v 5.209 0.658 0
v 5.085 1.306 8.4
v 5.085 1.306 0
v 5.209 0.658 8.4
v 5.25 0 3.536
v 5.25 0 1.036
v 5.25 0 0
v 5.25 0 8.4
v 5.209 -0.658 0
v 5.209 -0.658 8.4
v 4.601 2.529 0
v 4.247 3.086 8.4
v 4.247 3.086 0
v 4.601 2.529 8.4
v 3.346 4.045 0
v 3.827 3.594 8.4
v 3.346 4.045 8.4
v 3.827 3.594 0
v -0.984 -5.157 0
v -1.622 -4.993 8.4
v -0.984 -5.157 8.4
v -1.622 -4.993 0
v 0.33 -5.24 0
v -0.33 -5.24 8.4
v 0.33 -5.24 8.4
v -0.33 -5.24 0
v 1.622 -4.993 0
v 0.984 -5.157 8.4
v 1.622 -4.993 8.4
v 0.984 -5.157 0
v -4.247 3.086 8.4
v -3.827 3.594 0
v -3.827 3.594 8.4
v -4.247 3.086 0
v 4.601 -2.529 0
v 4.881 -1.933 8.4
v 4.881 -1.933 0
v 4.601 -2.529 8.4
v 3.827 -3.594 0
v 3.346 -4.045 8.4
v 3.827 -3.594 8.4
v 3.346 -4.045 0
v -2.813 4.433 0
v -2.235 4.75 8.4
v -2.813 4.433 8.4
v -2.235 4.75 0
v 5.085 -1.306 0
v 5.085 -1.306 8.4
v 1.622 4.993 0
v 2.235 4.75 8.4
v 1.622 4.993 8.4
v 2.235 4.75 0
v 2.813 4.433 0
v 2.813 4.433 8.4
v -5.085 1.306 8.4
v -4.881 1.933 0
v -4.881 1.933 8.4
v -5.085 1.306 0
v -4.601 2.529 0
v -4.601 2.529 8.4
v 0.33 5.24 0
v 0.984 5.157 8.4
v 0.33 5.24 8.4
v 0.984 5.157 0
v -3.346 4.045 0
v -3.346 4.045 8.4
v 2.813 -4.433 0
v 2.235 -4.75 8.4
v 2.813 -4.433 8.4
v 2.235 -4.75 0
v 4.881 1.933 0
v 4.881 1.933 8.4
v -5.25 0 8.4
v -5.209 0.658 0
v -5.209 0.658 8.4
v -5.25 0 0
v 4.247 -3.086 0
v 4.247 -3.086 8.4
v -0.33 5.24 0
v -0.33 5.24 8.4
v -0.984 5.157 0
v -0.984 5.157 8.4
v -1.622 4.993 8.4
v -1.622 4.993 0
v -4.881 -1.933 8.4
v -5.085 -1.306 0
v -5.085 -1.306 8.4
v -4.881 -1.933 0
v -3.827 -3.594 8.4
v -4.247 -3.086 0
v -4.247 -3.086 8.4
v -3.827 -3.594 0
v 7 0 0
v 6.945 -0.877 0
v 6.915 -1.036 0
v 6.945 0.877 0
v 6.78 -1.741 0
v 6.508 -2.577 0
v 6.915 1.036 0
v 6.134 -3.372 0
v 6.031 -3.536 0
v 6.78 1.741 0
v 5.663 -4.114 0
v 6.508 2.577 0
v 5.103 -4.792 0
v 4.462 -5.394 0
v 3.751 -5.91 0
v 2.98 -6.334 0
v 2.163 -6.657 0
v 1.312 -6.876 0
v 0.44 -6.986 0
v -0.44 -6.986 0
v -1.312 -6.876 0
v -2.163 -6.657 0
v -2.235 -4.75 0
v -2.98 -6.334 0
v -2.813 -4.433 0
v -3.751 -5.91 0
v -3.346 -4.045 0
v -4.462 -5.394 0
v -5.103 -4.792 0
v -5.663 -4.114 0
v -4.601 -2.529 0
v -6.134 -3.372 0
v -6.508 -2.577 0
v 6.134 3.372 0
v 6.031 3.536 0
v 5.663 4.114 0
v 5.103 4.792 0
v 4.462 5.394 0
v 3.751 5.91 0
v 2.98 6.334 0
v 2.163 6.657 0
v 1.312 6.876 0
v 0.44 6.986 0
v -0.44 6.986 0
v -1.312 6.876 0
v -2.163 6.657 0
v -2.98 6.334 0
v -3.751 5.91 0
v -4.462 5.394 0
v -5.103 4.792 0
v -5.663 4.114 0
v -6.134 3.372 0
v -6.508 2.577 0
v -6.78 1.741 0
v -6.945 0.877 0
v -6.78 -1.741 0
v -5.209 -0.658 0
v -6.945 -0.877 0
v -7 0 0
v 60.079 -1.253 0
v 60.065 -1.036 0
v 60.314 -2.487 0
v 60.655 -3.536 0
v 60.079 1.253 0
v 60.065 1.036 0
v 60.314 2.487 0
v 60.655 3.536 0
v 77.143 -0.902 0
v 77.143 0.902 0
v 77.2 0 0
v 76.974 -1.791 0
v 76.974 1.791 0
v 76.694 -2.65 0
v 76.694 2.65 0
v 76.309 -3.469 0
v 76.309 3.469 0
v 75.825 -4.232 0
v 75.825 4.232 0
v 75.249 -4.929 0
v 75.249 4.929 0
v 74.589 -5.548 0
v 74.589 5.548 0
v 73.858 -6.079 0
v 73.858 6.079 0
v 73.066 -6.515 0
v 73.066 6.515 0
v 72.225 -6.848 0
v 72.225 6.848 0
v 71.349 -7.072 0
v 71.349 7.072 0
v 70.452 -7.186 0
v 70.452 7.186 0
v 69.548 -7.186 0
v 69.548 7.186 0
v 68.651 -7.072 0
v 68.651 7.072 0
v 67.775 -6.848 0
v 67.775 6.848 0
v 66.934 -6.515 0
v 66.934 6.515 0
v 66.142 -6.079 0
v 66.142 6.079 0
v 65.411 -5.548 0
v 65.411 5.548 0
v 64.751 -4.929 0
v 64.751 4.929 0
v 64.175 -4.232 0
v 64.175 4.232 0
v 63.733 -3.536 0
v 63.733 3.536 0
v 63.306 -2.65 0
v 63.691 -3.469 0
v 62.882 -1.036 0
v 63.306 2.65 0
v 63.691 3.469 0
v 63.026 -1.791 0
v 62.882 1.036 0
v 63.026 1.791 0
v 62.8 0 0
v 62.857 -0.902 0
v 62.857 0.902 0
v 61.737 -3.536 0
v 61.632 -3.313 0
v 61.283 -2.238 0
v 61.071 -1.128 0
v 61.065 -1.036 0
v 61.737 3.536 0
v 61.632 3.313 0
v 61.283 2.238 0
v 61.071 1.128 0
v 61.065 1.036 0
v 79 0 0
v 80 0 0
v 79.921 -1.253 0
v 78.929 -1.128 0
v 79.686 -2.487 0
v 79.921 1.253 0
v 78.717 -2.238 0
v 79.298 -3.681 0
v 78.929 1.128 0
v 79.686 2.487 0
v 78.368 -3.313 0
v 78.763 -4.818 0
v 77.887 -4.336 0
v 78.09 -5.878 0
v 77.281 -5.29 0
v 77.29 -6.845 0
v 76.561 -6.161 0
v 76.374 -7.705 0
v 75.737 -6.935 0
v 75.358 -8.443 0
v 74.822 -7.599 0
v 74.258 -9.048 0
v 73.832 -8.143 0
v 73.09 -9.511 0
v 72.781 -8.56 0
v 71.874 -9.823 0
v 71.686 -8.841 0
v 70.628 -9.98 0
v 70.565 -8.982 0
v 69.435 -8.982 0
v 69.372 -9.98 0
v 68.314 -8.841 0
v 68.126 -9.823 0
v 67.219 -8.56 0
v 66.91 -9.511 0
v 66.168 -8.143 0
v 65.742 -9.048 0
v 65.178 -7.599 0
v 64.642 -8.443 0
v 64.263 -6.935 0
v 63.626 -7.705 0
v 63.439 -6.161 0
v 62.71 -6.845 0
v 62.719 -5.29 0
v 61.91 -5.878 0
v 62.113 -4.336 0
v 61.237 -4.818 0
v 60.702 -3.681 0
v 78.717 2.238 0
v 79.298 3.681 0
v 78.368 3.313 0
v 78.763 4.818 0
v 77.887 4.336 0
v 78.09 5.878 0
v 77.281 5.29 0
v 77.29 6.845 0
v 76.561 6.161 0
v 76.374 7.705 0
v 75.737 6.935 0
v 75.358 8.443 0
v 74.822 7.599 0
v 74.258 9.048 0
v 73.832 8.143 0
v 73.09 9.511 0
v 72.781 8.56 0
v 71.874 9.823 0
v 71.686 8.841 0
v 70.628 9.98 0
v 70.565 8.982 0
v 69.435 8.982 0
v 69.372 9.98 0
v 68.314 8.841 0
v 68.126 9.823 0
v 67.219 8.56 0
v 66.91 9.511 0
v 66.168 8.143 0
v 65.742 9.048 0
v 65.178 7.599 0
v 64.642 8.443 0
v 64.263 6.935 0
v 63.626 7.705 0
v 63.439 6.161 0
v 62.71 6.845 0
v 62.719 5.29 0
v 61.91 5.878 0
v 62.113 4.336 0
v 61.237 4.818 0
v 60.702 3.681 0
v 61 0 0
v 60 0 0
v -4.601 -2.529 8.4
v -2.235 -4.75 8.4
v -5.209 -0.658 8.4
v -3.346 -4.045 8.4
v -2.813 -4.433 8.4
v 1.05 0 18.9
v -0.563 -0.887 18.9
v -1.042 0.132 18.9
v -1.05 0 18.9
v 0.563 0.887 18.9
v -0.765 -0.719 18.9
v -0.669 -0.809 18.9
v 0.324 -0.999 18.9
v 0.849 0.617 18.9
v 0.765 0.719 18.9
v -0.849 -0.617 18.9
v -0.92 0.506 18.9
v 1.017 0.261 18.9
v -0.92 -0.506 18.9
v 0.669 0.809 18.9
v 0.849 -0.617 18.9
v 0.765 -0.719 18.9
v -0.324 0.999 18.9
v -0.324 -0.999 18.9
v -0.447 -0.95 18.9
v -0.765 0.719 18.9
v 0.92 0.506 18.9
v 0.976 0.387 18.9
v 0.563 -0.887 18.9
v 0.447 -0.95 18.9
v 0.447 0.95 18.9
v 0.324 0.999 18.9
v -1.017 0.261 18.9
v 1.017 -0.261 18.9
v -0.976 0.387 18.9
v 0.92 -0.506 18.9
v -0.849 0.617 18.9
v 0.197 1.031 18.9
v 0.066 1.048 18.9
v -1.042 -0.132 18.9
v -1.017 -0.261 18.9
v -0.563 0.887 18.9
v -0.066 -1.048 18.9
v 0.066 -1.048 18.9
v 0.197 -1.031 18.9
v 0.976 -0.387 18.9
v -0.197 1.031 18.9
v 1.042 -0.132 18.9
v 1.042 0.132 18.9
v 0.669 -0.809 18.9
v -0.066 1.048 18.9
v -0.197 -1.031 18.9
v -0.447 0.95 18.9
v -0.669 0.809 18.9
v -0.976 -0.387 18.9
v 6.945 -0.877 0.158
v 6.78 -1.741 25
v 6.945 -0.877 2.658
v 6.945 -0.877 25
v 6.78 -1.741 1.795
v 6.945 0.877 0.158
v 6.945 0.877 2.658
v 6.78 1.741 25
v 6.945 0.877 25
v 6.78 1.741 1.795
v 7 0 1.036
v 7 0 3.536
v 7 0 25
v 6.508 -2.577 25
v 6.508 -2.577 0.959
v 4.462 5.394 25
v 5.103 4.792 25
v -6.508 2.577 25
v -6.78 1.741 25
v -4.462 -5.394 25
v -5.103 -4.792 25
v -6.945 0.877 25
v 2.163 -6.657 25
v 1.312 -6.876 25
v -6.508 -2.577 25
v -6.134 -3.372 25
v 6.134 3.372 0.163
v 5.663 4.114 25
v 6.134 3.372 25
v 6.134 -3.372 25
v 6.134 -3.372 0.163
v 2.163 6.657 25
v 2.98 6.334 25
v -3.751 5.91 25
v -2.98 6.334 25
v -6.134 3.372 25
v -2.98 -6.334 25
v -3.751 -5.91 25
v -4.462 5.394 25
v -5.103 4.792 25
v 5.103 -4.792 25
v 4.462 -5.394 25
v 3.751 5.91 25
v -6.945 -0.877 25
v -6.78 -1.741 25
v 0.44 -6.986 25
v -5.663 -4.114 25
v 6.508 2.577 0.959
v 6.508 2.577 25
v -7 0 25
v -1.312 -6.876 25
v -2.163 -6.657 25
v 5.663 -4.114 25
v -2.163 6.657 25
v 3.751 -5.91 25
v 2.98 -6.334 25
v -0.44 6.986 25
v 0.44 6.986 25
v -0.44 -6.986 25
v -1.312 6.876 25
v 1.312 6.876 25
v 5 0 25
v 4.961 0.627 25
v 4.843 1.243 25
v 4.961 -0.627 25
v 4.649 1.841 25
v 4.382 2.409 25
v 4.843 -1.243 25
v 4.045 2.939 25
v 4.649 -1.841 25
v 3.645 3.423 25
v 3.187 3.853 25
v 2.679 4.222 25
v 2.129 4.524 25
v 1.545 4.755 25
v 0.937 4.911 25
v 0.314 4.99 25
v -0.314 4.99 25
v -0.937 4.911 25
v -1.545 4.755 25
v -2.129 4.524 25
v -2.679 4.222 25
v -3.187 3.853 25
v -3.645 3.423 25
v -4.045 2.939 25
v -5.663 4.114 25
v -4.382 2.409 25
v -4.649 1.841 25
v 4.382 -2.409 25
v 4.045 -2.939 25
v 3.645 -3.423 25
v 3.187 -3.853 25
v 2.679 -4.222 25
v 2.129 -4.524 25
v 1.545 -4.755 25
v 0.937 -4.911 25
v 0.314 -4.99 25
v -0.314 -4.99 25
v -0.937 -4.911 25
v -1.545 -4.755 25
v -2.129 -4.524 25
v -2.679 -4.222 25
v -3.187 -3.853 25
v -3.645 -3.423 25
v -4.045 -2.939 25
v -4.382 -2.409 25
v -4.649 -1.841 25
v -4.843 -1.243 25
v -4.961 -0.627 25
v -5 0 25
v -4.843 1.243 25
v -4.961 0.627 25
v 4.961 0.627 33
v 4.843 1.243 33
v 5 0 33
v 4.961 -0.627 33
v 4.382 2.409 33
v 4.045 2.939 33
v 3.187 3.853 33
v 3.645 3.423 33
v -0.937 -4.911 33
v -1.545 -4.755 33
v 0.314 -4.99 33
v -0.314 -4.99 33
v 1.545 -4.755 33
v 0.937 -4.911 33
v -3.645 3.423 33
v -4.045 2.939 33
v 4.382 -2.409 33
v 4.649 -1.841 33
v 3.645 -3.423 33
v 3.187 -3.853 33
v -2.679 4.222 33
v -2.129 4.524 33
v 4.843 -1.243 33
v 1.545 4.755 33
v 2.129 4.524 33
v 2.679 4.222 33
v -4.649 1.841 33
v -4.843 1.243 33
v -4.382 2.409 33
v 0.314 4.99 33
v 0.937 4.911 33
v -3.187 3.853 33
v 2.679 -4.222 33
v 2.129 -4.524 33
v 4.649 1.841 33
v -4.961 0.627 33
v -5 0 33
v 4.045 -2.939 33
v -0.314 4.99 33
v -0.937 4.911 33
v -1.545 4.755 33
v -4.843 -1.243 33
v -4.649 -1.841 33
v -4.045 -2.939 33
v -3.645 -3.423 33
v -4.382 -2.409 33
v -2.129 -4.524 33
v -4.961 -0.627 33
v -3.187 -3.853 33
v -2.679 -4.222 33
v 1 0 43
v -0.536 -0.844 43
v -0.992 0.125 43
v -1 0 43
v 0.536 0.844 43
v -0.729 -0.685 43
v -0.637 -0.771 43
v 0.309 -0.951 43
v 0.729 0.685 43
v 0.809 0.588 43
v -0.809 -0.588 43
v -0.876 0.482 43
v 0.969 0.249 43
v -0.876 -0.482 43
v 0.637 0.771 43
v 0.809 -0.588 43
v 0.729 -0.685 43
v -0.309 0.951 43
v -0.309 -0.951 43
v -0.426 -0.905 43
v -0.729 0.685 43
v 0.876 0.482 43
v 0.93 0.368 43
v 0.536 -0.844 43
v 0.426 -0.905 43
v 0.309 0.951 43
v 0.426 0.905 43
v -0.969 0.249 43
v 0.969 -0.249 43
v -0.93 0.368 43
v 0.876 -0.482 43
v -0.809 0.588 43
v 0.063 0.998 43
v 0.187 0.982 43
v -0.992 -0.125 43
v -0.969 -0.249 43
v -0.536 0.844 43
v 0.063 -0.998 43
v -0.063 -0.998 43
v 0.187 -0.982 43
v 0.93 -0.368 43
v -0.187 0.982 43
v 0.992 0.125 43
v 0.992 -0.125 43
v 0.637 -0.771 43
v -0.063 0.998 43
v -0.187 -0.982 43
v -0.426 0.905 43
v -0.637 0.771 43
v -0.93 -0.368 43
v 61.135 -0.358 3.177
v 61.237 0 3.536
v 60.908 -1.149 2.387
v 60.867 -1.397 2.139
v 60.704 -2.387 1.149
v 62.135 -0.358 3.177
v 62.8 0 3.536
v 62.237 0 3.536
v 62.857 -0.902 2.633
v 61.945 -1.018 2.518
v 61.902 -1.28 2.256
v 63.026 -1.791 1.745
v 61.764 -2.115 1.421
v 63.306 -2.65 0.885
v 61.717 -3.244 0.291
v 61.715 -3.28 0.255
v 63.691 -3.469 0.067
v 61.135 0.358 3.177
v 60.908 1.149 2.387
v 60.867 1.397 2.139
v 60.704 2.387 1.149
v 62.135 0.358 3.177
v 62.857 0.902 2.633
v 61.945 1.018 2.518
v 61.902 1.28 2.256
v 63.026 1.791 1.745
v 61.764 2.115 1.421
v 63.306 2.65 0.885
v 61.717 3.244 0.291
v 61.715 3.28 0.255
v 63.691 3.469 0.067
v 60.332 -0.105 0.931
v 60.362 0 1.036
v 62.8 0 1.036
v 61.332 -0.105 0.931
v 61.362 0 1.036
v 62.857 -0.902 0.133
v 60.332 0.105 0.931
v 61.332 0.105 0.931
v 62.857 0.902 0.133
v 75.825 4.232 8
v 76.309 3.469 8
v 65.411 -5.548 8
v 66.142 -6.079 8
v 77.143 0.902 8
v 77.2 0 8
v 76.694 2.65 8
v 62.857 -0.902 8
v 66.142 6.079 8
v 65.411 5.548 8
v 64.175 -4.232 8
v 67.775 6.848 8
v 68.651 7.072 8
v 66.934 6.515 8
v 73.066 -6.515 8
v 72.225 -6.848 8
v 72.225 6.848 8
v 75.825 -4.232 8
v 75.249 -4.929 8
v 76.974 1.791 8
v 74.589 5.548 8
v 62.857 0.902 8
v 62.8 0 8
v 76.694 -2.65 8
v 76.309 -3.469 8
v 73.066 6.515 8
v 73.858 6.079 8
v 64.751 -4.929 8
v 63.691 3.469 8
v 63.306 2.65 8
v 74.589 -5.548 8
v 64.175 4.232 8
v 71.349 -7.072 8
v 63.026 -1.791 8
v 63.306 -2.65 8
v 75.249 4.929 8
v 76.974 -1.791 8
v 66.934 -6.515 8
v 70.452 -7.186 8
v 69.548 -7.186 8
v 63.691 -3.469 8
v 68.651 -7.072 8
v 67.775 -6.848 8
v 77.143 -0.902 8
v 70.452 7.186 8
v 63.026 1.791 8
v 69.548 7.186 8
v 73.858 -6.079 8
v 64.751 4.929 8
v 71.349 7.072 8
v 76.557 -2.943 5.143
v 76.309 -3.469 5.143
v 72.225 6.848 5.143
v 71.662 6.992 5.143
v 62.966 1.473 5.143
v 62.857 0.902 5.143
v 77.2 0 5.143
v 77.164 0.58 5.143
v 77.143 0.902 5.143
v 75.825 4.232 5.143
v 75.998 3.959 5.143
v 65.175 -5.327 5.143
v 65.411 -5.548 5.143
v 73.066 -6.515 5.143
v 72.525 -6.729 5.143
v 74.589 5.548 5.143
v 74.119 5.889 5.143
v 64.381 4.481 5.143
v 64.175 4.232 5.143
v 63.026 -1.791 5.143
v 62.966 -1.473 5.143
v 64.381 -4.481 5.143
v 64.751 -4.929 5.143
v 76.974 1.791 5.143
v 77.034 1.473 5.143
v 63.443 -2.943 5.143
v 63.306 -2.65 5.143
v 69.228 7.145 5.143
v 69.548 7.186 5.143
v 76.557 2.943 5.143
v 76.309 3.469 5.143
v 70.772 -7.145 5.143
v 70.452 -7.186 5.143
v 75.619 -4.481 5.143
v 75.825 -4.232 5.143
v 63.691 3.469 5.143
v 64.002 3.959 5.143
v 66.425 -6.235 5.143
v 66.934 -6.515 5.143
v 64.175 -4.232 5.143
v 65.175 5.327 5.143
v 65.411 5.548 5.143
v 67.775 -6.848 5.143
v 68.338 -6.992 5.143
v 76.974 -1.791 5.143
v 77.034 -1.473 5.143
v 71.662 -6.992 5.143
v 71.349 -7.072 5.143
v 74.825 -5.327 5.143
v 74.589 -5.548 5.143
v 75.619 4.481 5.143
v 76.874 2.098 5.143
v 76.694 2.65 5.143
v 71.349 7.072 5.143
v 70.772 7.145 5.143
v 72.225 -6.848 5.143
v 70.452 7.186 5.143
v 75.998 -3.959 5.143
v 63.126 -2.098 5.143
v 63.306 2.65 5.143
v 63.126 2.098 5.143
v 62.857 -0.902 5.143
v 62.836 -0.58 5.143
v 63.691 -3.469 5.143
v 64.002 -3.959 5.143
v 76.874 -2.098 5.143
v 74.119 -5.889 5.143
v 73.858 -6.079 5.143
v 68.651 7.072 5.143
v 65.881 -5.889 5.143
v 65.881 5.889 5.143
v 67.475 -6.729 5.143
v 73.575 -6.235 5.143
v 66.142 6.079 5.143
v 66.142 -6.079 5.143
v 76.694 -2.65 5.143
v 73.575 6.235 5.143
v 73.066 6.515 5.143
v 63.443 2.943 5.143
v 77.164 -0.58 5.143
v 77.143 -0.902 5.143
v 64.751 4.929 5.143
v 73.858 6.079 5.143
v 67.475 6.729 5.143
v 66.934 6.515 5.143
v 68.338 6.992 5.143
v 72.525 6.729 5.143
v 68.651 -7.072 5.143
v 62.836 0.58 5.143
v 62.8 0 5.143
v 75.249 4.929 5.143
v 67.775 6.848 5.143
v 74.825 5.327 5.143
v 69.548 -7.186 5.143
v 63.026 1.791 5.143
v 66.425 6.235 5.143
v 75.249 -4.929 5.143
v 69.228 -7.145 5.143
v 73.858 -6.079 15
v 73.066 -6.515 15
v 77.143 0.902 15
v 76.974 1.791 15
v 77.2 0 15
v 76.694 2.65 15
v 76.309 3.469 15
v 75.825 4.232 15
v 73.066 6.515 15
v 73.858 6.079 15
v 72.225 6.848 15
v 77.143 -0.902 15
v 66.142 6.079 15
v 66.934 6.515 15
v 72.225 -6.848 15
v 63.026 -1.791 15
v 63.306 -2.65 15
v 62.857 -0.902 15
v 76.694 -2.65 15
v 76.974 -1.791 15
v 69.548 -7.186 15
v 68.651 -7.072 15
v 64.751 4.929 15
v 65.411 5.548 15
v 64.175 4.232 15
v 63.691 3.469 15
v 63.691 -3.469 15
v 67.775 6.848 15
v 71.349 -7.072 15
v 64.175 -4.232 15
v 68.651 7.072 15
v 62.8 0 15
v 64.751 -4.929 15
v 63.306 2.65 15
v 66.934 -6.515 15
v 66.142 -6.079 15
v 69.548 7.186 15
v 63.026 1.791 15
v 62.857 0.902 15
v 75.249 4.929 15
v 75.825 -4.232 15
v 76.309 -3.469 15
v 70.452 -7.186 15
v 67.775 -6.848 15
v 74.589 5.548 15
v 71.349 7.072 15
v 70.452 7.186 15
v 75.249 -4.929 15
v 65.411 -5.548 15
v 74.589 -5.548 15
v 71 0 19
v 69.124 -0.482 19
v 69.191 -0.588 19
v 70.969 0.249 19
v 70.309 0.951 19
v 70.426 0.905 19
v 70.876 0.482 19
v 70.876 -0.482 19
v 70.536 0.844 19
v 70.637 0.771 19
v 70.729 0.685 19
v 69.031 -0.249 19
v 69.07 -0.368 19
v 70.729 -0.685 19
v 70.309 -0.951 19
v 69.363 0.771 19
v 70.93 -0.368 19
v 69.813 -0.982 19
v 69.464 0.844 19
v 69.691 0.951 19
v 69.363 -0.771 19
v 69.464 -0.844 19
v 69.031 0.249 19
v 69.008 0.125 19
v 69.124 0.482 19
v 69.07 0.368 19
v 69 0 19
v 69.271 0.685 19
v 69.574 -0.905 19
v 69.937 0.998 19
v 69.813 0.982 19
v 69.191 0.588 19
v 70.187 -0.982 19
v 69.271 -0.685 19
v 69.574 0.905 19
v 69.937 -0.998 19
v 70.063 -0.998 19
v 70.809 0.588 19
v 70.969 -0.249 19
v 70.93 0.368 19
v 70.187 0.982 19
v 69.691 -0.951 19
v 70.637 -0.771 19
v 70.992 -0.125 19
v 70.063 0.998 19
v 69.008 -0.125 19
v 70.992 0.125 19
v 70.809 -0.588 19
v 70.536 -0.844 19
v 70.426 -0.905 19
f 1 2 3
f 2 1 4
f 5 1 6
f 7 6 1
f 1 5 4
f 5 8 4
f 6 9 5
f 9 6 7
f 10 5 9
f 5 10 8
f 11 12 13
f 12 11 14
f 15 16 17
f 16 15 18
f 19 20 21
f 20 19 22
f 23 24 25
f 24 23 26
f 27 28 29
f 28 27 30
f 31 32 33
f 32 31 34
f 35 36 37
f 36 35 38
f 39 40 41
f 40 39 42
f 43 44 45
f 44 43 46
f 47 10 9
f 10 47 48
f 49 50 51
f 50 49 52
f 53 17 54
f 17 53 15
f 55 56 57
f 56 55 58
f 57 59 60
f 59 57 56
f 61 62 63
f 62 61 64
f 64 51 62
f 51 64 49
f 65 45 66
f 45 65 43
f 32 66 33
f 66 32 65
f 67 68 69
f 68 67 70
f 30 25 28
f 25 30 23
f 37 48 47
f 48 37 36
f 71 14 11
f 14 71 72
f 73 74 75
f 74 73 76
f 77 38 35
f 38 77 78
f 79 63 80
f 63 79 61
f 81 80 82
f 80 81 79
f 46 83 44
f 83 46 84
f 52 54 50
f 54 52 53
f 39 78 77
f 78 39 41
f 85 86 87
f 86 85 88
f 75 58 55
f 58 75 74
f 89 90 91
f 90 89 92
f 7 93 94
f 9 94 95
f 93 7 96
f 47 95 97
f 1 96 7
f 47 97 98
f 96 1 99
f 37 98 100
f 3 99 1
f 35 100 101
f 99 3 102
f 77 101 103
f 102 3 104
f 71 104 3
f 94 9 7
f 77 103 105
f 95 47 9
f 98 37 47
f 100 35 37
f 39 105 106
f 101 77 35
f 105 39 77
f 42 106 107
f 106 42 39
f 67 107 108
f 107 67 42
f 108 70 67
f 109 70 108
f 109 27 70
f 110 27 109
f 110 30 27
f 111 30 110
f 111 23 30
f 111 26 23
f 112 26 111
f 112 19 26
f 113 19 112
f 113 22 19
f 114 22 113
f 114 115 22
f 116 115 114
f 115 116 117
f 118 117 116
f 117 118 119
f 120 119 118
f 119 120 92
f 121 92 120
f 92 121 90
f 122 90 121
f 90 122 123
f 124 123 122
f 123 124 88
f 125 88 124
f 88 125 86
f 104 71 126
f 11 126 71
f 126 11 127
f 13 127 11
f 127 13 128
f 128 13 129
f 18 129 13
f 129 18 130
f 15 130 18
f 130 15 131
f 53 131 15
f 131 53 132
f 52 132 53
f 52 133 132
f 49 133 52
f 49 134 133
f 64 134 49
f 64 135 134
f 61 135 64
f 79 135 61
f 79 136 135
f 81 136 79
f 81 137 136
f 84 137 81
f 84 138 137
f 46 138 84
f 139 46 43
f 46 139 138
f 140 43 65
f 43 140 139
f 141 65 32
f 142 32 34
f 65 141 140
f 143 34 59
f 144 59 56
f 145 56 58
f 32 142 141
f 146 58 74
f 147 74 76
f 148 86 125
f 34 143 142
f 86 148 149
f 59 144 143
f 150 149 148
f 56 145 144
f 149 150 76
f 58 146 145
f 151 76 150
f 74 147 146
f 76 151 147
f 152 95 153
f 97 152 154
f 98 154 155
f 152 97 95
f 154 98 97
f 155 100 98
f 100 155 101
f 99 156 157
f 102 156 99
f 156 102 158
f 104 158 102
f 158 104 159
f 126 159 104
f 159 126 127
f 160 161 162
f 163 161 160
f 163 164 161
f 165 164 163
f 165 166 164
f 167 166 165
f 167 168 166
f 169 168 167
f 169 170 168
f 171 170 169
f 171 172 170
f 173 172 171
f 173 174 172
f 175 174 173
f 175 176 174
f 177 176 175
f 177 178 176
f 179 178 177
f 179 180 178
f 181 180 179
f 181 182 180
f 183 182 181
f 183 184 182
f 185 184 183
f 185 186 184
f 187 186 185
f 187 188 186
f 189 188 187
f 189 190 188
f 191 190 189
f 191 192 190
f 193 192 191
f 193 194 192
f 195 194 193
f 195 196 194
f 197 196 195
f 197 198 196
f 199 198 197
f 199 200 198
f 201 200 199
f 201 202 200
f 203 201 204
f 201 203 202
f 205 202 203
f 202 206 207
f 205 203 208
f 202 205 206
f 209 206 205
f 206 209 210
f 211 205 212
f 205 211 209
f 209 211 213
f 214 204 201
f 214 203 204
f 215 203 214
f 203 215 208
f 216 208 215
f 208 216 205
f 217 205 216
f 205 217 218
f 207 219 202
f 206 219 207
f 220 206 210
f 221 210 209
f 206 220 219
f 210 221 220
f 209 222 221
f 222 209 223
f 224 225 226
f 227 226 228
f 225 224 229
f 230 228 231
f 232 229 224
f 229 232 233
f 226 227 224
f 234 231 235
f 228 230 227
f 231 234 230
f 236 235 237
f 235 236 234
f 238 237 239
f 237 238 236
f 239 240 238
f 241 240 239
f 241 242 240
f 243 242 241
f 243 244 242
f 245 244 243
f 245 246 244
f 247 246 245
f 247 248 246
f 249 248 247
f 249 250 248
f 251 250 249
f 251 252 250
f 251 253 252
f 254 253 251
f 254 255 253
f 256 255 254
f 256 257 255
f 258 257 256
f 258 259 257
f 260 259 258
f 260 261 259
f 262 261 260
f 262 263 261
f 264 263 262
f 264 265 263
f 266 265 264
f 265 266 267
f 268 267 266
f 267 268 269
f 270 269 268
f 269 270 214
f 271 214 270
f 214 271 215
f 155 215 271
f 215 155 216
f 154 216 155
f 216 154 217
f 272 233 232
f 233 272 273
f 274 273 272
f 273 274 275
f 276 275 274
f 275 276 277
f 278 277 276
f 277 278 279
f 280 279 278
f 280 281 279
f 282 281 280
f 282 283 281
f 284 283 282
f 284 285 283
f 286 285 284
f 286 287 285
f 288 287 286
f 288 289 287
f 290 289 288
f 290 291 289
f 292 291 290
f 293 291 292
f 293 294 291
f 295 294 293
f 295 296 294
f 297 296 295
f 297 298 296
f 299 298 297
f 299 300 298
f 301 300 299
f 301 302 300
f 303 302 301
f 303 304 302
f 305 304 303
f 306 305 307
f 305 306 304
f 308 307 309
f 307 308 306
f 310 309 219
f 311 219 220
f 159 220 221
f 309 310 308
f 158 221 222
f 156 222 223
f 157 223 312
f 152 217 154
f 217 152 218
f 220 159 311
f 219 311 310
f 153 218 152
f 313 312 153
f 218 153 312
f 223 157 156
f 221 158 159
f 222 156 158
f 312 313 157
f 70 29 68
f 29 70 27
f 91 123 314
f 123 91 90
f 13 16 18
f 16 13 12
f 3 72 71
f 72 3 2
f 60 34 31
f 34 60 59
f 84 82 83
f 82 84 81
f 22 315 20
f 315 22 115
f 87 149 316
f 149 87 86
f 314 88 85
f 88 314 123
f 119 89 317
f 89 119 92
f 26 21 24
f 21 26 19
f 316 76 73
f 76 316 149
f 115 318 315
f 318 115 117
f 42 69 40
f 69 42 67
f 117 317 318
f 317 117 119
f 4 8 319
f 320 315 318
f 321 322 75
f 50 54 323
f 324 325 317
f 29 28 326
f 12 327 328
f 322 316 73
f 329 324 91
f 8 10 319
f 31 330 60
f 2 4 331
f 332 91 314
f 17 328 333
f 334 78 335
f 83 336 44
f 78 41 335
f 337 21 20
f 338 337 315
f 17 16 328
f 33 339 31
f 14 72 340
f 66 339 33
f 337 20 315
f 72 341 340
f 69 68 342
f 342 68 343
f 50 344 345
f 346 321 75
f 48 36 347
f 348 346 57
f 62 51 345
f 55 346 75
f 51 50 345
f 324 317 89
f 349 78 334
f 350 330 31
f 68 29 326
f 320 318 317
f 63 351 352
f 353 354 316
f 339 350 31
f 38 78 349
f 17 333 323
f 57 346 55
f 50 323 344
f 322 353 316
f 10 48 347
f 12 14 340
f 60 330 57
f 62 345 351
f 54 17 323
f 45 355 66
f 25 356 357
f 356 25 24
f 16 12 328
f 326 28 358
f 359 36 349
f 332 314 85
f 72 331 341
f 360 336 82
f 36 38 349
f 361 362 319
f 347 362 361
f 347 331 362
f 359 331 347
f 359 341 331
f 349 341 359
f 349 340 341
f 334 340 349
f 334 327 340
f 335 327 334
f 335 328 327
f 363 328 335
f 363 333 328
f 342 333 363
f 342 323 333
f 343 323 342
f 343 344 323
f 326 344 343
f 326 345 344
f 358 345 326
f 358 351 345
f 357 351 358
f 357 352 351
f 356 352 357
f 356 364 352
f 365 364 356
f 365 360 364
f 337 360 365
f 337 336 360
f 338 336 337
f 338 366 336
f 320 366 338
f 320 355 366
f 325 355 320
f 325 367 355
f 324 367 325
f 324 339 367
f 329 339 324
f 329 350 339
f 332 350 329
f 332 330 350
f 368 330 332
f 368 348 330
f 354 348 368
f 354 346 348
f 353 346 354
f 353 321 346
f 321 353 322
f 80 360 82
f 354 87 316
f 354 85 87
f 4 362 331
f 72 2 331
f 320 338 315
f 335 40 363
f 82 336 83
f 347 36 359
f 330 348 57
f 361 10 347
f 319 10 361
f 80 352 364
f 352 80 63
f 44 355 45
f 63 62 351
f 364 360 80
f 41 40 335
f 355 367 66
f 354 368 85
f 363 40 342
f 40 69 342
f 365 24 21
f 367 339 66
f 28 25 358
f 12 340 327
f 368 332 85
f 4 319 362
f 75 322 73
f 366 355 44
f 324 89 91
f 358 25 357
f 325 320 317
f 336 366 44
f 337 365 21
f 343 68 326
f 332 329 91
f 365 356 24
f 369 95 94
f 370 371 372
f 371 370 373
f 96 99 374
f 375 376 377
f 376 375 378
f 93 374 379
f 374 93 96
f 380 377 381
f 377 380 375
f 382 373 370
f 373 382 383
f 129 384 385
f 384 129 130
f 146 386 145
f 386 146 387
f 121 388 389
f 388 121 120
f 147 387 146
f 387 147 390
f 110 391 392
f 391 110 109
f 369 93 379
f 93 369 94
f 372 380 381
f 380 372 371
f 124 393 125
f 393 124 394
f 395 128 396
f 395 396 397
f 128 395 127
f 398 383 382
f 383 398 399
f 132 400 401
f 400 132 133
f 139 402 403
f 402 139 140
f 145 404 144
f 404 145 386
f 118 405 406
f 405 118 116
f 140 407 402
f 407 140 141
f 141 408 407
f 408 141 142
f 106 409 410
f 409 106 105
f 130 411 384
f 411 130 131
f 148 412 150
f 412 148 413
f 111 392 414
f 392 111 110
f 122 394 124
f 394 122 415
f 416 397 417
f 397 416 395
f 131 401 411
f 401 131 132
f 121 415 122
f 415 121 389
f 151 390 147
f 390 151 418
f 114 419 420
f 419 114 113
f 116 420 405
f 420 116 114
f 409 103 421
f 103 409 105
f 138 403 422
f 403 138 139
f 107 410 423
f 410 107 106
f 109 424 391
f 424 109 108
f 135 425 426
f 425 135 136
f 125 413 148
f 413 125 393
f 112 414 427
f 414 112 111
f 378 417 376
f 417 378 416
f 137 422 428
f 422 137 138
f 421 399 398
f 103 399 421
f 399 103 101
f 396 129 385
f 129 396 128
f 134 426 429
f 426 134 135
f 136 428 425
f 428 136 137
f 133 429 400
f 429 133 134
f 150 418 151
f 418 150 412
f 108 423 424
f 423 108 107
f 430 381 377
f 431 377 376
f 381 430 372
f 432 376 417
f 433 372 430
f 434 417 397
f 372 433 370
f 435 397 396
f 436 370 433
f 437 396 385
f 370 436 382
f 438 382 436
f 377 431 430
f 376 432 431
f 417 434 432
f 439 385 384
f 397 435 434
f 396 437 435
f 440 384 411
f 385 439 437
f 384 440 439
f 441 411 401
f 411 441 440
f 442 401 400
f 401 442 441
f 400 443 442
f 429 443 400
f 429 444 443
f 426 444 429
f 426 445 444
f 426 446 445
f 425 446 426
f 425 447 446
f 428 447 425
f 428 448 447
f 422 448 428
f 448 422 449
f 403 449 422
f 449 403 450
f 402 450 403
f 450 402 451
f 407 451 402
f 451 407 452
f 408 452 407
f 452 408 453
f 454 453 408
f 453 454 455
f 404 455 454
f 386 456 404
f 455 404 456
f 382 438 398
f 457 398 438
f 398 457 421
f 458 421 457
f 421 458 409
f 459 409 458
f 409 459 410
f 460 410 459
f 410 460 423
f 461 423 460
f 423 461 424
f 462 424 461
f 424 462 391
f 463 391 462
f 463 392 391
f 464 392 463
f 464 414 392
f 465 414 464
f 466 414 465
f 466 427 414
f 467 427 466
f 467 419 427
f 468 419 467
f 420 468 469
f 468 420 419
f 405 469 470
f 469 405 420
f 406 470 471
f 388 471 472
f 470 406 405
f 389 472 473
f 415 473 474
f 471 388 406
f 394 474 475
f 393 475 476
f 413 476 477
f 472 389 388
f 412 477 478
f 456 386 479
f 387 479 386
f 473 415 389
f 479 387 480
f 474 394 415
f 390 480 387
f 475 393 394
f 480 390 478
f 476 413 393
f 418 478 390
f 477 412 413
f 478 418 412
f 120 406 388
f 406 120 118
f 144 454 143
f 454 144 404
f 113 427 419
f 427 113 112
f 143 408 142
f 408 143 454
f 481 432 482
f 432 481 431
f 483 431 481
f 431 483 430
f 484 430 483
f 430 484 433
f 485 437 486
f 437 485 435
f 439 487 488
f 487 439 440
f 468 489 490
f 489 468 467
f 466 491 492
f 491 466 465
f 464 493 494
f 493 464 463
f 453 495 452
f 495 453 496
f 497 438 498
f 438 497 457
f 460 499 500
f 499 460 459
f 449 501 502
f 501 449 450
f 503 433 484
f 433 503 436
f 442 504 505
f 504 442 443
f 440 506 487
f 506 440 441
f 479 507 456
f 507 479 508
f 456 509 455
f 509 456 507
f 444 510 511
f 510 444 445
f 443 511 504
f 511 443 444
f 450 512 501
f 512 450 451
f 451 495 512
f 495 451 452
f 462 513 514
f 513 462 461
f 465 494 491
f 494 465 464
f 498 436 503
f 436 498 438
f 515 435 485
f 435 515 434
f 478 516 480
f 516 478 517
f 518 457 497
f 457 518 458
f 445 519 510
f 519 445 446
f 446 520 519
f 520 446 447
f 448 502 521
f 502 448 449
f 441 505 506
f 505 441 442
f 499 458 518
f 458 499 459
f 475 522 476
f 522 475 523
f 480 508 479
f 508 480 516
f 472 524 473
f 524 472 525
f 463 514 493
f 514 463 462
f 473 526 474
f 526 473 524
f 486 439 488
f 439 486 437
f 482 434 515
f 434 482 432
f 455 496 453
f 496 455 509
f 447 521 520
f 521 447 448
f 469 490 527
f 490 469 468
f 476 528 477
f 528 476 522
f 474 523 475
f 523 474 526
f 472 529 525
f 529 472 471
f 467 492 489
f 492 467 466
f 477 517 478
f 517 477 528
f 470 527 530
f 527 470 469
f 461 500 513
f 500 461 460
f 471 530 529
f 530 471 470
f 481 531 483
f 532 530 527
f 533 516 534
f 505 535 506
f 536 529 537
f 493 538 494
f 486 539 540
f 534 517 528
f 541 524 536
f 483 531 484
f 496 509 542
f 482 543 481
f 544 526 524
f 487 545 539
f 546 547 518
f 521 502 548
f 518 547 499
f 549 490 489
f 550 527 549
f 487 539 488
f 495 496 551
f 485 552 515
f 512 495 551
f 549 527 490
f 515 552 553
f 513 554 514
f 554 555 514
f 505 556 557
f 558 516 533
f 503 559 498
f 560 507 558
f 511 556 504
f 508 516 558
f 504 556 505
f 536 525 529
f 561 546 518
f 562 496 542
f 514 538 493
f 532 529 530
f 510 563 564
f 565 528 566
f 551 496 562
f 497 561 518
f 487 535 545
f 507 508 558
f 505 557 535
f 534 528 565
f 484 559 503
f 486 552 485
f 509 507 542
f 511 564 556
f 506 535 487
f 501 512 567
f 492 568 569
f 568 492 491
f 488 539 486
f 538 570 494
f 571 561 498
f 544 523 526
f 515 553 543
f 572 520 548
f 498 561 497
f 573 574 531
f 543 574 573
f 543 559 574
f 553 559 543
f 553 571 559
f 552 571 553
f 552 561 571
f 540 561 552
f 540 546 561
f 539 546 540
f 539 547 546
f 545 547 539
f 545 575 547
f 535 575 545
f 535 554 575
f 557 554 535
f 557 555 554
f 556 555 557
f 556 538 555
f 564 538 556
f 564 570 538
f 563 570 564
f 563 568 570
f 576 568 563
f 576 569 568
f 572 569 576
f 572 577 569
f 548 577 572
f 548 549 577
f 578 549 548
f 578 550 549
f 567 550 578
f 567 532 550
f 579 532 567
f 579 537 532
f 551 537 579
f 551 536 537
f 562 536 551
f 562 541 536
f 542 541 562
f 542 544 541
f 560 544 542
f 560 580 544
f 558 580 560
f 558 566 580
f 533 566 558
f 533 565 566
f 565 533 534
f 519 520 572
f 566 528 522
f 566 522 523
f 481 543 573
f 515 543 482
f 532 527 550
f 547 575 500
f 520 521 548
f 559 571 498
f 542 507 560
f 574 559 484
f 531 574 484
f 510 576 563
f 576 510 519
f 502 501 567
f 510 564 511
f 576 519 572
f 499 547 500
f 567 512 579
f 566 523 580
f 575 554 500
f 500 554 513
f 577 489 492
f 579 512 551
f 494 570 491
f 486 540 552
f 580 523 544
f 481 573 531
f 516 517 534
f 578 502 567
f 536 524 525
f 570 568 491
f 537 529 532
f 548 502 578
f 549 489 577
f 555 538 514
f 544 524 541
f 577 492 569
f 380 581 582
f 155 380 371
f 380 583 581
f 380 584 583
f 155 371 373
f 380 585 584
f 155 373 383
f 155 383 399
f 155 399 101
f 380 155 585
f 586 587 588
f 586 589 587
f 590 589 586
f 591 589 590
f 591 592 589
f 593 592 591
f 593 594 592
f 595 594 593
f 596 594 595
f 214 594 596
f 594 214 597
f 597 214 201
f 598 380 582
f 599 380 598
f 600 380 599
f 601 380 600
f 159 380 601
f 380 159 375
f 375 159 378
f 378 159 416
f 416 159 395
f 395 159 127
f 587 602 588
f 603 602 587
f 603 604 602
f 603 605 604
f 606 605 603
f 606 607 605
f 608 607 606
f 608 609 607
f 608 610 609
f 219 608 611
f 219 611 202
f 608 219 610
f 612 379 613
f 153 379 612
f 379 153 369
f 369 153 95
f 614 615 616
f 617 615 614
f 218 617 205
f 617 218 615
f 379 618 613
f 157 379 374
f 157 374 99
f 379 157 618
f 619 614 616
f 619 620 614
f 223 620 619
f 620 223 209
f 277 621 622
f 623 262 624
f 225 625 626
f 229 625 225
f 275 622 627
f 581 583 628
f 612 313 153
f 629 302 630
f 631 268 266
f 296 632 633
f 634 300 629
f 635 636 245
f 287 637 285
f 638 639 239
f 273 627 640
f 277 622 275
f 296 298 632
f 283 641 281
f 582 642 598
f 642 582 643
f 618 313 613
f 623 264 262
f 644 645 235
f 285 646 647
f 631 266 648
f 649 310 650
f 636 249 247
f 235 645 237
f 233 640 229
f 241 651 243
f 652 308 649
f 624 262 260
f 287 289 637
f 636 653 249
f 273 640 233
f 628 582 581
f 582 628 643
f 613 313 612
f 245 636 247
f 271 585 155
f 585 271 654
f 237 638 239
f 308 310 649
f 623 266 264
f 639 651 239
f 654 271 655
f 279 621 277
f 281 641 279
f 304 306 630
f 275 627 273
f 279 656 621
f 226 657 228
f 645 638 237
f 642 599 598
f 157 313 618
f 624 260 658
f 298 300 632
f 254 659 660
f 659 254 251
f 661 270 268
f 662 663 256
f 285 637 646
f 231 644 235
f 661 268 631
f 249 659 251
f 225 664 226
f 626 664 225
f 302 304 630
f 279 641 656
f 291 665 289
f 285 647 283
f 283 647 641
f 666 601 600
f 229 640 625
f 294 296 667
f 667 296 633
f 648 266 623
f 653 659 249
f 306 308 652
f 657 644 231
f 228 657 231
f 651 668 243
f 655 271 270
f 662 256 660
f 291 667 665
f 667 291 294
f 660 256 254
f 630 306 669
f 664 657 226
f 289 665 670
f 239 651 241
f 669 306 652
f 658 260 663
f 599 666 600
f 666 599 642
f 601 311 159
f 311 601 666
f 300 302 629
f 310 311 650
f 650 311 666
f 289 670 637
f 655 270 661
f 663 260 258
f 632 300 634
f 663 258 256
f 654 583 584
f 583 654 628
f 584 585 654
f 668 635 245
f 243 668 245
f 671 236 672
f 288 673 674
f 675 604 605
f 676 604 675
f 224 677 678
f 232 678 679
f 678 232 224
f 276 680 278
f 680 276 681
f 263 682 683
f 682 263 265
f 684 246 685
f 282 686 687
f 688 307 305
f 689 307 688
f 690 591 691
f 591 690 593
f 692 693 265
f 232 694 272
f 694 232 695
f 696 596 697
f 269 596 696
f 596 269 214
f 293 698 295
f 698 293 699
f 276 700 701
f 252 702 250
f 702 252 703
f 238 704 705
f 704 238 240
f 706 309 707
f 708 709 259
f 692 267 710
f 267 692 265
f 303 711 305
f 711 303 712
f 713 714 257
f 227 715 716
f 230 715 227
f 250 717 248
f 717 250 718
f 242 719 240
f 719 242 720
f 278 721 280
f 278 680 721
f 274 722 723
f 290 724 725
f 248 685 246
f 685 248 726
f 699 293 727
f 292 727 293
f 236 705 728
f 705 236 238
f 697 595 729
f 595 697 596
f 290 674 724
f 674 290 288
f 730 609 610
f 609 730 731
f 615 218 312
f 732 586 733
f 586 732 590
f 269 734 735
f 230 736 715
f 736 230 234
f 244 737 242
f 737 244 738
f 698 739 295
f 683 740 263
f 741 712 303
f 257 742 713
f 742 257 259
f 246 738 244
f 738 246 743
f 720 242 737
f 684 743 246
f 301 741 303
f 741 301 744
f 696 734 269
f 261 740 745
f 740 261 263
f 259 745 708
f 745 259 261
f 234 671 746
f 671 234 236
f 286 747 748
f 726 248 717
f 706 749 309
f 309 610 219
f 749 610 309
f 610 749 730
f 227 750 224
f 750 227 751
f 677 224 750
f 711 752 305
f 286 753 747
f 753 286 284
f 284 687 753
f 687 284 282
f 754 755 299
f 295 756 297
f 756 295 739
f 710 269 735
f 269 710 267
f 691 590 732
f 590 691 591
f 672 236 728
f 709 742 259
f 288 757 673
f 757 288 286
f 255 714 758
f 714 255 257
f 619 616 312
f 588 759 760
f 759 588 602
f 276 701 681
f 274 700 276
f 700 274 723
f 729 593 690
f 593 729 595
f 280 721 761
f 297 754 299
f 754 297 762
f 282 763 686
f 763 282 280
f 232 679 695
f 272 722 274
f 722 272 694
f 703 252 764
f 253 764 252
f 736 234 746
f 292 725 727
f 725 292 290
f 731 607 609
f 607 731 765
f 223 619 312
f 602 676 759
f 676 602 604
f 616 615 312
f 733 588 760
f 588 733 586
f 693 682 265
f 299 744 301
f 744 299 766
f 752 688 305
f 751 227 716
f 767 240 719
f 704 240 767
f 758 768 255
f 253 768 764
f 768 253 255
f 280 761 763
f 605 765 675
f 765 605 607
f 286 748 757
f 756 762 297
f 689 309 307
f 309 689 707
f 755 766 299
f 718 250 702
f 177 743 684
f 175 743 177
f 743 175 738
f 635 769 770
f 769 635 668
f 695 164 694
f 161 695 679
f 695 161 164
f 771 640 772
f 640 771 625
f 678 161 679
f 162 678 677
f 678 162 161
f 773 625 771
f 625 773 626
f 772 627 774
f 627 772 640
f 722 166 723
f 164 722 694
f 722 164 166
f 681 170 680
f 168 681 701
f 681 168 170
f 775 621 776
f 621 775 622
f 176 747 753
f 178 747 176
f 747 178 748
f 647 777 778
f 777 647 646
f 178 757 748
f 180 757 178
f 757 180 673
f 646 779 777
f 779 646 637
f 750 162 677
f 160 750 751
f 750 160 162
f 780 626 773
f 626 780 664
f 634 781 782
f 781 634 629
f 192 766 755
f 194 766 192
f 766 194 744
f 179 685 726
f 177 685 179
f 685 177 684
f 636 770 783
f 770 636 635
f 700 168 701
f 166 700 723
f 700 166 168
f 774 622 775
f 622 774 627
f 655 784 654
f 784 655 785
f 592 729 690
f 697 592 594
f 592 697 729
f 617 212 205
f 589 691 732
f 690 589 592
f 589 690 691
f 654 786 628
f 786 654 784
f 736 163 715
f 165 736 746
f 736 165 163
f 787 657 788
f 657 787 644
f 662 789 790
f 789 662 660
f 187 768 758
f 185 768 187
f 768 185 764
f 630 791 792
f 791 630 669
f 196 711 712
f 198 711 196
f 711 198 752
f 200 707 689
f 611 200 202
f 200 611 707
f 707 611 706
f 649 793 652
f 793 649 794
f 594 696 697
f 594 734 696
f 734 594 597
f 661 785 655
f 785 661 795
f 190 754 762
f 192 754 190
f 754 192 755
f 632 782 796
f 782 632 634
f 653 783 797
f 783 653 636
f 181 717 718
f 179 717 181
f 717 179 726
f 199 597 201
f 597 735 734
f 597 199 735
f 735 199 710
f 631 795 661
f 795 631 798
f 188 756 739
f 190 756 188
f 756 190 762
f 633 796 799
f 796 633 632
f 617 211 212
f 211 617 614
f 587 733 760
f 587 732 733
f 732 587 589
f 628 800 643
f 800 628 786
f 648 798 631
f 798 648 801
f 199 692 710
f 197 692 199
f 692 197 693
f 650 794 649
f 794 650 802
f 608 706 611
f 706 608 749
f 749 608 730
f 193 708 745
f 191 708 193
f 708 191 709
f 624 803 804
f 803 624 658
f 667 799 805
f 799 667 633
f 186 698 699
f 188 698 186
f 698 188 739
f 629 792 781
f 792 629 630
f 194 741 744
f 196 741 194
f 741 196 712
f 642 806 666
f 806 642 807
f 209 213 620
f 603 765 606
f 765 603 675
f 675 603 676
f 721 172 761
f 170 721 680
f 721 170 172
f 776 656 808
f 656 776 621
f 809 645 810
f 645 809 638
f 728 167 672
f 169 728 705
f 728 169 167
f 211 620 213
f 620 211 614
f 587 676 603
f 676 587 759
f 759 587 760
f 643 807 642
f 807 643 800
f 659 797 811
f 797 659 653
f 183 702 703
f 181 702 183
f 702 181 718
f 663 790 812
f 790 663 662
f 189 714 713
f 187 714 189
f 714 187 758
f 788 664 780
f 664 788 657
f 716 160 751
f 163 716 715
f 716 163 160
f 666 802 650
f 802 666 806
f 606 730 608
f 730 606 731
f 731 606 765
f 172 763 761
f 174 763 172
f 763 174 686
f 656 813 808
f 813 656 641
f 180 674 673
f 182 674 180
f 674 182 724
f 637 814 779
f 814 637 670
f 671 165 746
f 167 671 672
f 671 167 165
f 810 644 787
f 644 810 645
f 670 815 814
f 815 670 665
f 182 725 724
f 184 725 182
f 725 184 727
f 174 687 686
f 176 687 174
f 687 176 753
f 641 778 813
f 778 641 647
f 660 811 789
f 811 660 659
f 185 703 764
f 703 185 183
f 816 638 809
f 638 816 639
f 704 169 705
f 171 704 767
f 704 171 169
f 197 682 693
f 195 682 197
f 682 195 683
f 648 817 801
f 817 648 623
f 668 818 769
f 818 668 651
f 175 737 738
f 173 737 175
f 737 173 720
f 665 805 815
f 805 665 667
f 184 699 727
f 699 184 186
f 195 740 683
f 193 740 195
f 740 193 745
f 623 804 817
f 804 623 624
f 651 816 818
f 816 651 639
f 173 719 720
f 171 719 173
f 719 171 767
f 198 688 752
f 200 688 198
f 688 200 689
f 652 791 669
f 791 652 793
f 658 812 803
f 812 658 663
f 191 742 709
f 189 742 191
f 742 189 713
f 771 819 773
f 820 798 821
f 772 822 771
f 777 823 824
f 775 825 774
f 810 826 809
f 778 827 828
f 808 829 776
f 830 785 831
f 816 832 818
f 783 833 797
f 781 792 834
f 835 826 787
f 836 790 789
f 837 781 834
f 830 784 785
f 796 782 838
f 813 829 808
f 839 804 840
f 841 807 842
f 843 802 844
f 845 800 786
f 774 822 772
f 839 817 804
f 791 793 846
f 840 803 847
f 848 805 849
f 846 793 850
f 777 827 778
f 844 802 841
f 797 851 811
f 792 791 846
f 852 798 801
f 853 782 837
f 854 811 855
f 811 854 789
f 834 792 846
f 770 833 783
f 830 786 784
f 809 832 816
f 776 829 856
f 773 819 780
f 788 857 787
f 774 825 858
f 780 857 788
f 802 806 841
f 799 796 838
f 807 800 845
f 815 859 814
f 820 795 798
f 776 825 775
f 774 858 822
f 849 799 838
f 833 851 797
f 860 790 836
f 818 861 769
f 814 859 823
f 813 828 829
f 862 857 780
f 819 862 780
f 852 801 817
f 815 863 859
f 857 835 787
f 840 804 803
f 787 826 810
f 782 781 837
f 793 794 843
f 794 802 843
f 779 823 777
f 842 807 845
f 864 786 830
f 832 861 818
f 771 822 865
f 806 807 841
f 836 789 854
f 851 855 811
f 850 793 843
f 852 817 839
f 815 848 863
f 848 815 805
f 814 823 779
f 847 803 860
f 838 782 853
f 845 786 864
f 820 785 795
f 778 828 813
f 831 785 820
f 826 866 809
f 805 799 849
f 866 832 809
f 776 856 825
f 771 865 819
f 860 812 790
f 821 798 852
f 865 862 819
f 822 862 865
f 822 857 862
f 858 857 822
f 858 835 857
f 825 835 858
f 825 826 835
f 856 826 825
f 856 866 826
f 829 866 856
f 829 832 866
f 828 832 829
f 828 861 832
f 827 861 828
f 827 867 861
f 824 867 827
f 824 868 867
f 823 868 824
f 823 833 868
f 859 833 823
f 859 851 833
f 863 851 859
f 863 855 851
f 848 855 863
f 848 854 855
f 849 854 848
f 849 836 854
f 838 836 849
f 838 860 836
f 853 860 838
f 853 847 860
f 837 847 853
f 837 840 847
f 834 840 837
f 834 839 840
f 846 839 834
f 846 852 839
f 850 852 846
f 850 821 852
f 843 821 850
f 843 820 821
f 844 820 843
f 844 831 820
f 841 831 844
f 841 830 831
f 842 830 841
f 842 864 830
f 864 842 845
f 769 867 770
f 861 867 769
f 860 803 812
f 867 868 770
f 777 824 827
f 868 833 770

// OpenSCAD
/* [General] */
partToMake = 0; //[0:CD Holder, 1:Foot]
tolerance = 1.05;
resolution = 50; //[4:100]

/* [Stackable] */
baseHeight = 25; //[10:100]
baseWidth = 7; //[3:20]

topHeight = 8; //[2:20]
topWidth = 5; //[2:20]
topConeHeight = 10; //[0:20]

/* [Foot] */
feetNum = 5; //[3:10]
feetWidth = 3; //[1:10]
feetLength = 22; //[5:50]
footHeight = 5; //[1:10]
footWidth = 11; //[0:40]

/* [Shaft] */
shaftLength = 70; //[30:200]
shaftWidth = 5; //[2:20]

/* [CD holder] */
cdPoleRadius = 7.2;
cdPoleHeight = 15; //[5:50]
cdPoleHatHeight = 4; //[0:10]
cdBaseWidth = 10; //[0:30]
cdBaseHeight = 8; //[0:50]

/* [Hidden] */
$fn = resolution;

module top()
{
	//Create top cylinder
	
	cylinder(h=topHeight, r=topWidth);
	
	//Create a cone at the very top
	translate([0, 0, topHeight])
		cylinder(topConeHeight, topWidth);
}

module stackable()
{
	difference()
	{
		cylinder(h=baseHeight, r=baseWidth); //Base-cylinder

		scale(tolerance, tolerance, tolerance) //Scale the top-hole using tolerance
			top(); //Cut a top-shaped hole in the base
	}

	translate([0, 0, baseHeight]) top(); //Add the top, on top of the base
}

module foot()
{
	stackable();
	
	for(i = [0:feetNum])
	{
		rotate(i*(360/feetNum), [0, 0, 1])
		{
			translate([feetLength/2+topWidth, 0, feetWidth/2])
				cube([feetLength, feetWidth, feetWidth], center = true);
			
			translate([feetLength+topWidth, 0, 0])
				cylinder(footHeight, footWidth);
		}
	}
}

module shaft()
{
	difference()
	{
		translate([0, 0, -shaftWidth/2])
			rotate(45, [1, 0, 0])
				cube([shaftLength, shaftWidth, shaftWidth], center = true);
				
		translate([0, 0, -shaftWidth])
			rotate(45, [1, 0, 0])
				cube([shaftLength, shaftWidth, shaftWidth], center = true);
		
		translate([0, 0, -shaftWidth])
			cube([shaftLength, shaftWidth*2, shaftWidth], center = true);
	}
	
}

module cdPole()
{	
	difference()
	{
		cylinder(cdBaseHeight, cdBaseWidth, cdPoleRadius); //CD base cone
		scale(0.9, 0.9, 0.9) cylinder(cdBaseHeight, cdBaseWidth, cdPoleRadius); //CD base cone
	}
	
	cylinder(h=cdPoleHeight, r=cdPoleRadius); //CD pole
	
	translate([0, 0, cdPoleHeight])
		cylinder(cdPoleHatHeight, cdPoleRadius); //CD top cone
}


if( partToMake == 1 )
{
	foot();
}
else
{
	stackable();
	translate([shaftLength/2+topWidth*tolerance, 0, shaftWidth/2]) shaft();
	translate([shaftLength, 0, 0]) cdPole();
}
